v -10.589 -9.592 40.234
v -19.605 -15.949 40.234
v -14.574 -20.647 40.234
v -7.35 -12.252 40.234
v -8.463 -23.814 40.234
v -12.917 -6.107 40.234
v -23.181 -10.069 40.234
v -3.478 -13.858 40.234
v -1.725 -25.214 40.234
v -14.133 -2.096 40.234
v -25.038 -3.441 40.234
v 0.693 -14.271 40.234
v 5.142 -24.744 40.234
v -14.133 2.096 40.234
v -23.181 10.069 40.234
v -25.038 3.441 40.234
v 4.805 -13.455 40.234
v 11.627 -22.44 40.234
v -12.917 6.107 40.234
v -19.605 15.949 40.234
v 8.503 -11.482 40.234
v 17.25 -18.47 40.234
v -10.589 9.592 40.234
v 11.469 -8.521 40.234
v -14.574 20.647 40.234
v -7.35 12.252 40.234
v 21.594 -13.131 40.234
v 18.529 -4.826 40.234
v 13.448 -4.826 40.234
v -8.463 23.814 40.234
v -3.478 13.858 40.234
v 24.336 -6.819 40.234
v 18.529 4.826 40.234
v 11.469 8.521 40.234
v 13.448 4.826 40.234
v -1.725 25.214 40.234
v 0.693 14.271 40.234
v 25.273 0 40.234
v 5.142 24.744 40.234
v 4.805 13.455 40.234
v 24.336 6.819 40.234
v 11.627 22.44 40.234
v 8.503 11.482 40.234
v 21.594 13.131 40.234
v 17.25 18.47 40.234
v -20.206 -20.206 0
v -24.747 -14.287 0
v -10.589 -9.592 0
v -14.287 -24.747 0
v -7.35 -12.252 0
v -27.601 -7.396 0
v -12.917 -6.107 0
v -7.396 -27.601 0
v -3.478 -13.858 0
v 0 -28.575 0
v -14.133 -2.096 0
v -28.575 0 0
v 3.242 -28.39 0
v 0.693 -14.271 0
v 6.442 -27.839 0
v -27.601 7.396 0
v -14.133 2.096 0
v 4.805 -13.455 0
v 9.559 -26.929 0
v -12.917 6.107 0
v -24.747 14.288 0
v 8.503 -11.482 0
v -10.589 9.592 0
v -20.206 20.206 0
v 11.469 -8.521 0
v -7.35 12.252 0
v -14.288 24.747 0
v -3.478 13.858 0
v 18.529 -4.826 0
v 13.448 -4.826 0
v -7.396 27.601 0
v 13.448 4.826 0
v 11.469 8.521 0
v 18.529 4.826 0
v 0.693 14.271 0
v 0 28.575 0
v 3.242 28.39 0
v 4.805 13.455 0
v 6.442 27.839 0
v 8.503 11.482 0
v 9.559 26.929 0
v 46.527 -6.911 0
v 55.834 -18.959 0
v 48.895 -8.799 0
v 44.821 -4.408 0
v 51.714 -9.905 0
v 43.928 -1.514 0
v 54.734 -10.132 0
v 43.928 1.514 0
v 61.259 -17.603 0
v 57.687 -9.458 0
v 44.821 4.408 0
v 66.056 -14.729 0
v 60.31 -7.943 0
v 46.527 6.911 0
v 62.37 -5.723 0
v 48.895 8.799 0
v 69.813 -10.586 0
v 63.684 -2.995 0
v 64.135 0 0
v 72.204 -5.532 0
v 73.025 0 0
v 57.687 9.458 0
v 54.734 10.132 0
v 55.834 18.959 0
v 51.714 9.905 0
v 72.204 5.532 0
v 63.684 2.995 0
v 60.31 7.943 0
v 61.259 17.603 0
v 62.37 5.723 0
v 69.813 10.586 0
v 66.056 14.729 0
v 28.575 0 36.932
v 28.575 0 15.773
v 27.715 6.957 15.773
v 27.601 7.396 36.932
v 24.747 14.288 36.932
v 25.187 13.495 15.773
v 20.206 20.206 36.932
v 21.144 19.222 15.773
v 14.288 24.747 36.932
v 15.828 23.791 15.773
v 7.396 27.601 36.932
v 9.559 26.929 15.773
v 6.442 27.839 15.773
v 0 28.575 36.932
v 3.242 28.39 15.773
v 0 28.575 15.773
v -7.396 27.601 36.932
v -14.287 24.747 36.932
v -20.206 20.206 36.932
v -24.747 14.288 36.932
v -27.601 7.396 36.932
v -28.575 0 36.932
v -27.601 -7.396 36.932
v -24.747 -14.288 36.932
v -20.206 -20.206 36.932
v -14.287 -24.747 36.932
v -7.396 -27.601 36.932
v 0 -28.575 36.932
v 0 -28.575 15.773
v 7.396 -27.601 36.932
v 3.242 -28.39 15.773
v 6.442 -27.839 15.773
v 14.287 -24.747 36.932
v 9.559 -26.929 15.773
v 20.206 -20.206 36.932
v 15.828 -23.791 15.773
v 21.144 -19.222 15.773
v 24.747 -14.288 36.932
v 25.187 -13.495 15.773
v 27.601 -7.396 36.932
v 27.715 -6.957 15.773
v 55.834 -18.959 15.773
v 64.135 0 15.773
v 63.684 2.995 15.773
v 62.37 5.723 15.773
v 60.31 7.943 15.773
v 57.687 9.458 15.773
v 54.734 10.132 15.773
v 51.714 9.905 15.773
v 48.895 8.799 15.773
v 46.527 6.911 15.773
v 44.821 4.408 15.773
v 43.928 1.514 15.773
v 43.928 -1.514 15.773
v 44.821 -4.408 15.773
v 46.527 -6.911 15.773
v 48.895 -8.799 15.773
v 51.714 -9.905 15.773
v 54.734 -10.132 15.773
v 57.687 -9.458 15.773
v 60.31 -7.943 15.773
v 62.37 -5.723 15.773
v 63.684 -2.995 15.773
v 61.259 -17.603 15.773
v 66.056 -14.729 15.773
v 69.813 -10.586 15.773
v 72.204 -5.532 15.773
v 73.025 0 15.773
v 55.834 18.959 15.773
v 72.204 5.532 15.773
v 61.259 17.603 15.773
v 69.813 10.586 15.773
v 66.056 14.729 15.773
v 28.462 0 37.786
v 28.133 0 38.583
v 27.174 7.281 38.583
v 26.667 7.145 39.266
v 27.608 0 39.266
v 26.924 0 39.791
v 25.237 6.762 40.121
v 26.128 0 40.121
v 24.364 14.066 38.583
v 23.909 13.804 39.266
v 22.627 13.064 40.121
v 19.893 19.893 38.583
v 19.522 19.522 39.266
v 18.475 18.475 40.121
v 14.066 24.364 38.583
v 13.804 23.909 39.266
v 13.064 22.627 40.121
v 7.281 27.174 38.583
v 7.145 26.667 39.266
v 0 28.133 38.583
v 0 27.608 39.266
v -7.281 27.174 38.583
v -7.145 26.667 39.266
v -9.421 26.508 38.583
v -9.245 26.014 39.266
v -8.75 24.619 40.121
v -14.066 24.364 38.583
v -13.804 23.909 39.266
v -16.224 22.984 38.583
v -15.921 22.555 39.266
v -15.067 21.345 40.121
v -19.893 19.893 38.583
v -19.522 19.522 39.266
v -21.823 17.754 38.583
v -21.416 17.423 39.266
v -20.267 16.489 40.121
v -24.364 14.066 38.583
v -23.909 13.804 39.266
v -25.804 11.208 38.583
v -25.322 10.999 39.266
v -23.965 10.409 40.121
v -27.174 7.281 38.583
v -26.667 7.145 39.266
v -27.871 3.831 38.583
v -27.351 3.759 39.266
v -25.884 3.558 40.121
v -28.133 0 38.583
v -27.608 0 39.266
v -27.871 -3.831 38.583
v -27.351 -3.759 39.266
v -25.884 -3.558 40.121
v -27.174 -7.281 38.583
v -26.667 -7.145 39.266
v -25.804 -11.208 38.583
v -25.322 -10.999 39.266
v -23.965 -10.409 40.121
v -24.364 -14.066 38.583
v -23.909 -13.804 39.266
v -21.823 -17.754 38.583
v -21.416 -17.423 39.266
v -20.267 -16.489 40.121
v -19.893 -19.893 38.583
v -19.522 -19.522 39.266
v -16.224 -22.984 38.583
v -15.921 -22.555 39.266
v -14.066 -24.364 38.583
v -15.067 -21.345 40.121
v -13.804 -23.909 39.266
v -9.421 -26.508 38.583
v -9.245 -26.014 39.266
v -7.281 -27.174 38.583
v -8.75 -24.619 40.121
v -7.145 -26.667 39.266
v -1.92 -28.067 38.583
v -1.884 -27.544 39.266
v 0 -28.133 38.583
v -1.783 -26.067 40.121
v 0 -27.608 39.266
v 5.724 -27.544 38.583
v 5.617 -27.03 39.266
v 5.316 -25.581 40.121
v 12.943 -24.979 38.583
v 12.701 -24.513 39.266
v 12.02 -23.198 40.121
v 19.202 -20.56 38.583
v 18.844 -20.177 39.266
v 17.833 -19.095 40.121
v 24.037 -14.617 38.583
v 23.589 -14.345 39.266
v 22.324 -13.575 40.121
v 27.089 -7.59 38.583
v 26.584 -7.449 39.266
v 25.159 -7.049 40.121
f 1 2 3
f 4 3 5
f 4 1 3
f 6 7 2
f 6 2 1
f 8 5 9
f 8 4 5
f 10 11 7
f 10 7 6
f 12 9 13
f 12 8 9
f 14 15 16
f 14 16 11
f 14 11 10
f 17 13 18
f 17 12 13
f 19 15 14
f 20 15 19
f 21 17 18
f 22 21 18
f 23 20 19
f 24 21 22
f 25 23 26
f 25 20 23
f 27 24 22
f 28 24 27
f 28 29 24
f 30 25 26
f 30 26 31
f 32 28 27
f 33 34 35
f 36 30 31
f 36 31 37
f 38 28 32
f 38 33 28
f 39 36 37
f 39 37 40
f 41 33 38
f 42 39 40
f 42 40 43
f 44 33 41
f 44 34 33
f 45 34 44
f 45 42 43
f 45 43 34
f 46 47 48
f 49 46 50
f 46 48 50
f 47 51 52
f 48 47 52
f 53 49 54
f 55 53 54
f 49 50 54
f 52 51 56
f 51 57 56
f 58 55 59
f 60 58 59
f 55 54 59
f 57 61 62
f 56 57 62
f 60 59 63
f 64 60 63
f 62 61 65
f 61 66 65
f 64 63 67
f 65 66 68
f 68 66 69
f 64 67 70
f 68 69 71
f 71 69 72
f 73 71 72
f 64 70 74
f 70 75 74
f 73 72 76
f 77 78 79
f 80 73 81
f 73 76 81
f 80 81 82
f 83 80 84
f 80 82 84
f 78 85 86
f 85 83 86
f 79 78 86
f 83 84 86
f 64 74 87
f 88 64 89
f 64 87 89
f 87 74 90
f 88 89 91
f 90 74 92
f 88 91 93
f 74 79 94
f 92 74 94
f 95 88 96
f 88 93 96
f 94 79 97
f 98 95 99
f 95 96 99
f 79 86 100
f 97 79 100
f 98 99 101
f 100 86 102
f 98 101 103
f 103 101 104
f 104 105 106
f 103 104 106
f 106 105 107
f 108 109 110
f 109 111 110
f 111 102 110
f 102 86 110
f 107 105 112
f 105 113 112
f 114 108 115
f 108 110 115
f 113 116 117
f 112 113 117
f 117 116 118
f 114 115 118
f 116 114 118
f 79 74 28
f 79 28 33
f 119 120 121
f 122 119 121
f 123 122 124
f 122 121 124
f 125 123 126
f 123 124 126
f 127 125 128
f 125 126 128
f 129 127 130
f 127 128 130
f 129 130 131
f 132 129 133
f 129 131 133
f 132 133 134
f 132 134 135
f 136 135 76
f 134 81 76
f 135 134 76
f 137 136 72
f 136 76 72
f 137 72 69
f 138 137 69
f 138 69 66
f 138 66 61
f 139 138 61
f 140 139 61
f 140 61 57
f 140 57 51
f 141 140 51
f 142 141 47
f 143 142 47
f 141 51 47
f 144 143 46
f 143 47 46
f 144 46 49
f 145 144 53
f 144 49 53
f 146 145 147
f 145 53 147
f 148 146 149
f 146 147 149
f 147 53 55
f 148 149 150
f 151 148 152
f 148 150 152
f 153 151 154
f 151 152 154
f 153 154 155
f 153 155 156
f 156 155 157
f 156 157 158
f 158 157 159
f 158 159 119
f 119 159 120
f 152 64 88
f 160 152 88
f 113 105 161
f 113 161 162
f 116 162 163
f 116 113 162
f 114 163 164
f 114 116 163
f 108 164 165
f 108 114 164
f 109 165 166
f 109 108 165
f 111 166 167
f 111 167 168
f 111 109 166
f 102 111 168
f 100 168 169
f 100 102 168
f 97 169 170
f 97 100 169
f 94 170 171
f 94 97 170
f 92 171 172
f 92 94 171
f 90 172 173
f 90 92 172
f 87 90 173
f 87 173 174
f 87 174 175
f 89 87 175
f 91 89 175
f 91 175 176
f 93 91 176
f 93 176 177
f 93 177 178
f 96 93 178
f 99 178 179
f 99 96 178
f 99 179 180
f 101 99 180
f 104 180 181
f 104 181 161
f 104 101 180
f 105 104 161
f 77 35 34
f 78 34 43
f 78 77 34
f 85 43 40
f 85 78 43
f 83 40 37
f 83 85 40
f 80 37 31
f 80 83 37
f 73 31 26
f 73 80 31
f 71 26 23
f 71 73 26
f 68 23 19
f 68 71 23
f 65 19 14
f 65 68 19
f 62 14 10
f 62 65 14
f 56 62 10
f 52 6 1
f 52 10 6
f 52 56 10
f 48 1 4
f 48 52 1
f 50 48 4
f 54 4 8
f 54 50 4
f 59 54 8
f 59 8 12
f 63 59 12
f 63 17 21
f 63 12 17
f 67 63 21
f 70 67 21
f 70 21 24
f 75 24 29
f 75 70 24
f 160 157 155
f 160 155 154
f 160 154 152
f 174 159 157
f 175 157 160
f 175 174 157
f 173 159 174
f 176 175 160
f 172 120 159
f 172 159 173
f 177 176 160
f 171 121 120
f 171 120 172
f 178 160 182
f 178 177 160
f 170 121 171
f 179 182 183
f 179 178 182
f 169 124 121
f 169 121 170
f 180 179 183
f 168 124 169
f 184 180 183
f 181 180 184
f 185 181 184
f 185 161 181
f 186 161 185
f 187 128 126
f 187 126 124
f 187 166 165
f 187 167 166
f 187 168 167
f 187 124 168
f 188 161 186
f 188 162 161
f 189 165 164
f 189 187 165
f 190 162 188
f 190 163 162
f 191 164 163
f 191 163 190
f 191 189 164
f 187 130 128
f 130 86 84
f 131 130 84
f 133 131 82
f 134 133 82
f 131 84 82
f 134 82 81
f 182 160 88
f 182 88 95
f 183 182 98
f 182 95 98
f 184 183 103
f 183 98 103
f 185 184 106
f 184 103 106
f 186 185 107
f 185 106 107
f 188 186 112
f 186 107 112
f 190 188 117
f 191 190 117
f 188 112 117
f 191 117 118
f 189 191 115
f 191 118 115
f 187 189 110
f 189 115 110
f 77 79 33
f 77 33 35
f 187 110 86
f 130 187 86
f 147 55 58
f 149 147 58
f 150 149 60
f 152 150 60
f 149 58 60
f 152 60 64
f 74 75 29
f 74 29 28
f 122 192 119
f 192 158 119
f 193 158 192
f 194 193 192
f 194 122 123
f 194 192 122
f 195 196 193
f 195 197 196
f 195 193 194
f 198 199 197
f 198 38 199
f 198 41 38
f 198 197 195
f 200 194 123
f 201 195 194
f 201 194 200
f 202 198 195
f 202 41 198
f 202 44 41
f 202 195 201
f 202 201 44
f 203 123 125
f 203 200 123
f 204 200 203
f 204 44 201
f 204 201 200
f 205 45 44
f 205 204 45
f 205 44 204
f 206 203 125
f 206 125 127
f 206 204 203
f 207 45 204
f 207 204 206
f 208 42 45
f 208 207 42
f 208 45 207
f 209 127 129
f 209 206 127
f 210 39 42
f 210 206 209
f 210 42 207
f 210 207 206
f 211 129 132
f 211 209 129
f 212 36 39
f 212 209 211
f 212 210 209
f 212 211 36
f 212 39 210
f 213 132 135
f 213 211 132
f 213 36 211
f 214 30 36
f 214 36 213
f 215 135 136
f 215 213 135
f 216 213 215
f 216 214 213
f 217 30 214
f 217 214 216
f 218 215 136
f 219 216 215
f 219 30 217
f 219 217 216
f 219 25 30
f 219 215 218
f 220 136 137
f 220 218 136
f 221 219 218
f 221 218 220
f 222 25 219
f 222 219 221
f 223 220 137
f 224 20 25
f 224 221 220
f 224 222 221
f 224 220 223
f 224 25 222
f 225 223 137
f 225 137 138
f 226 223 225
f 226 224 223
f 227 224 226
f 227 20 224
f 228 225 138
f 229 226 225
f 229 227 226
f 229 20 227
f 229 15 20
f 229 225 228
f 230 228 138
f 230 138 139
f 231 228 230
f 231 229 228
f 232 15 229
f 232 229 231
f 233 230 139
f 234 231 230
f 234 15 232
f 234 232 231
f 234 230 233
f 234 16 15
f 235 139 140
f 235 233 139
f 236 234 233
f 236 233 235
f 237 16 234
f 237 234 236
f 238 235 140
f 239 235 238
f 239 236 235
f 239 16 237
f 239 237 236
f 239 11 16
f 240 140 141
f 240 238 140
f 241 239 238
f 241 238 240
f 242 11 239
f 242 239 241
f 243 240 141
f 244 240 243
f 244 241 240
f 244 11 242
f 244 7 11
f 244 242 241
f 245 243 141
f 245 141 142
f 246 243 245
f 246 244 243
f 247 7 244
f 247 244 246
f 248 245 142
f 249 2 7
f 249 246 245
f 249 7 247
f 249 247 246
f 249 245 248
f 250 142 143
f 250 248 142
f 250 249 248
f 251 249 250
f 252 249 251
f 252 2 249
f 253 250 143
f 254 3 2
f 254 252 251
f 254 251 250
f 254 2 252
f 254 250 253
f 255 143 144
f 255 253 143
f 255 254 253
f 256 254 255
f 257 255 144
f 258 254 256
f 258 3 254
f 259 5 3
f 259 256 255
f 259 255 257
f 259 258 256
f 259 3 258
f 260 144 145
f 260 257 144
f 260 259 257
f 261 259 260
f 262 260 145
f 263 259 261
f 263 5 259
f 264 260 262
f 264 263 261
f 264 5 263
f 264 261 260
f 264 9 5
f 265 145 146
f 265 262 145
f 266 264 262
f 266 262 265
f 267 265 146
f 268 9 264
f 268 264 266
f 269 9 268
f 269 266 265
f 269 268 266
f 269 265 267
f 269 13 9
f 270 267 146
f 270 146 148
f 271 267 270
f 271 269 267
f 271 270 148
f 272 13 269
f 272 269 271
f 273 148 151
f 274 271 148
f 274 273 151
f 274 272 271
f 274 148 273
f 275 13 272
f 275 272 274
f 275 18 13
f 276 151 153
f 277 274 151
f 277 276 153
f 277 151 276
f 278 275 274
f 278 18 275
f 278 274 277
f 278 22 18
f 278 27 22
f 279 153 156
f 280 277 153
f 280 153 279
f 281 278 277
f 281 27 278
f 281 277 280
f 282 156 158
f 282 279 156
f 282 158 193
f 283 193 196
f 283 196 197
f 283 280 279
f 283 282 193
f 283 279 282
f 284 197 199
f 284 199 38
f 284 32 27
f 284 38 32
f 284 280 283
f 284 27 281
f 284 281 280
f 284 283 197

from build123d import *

# Parameters (mm, degrees)
F0_R     = 10.16
F1_DEPTH = 15.7734
F2_R     = 28.575
F3_DEPTH = 40.2336
F5_DEPTH = 40.2346
F6_R     = 3.302


with BuildPart() as f1:
    # F0 (on Top) → F1 (new body)
    with BuildSketch(Plane.XY):
        with BuildLine():
            Line((9.559057, 26.928703), (0, 28.575))
            ThreePointArc((0, 28.575), (-28.575, 0), (0, -28.575))
            Line((0, -28.575), (9.559057, -26.928703))
            ThreePointArc((9.559057, -26.928703), (23.341815, -16.48303), (28.575, 0))
            ThreePointArc((28.575, 0), (23.341815, 16.48303), (9.559057, 26.928703))
        make_face()
        with BuildLine():
            ThreePointArc((13.447765, -4.826), (-14.2875, 0), (13.447765, 4.826))
            Line((13.447765, 4.826), (18.5293, 4.826))
            Line((18.5293, 4.826), (18.5293, 0))
            Line((18.5293, 0), (18.5293, -4.826))
            Line((18.5293, -4.826), (13.447765, -4.826))
        make_face(mode=Mode.SUBTRACT)
        with BuildLine():
            ThreePointArc((9.559057, 26.928703), (4.849894, 28.160418), (0, 28.575))
            Line((0, 28.575), (9.559057, 26.928703))
        make_face()
        with BuildLine():
            Line((9.559057, -26.928703), (0, -28.575))
            ThreePointArc((0, -28.575), (4.849894, -28.160418), (9.559057, -26.928703))
        make_face()
        with BuildLine():
            Line((55.833732, 18.959104), (9.559057, 26.928703))
            ThreePointArc((9.559057, 26.928703), (23.341815, 16.48303), (28.575, 0))
            ThreePointArc((28.575, 0), (23.341815, -16.48303), (9.559057, -26.928703))
            Line((9.559057, -26.928703), (55.833732, -18.959104))
            ThreePointArc((55.833732, -18.959104), (73.025, 0), (55.833732, 18.959104))
        make_face()
        with Locations((53.975, 0)):
            Circle(F0_R, mode=Mode.SUBTRACT)
    extrude(amount=F1_DEPTH)

    # F2 (on Top) → F3 (join)
    with BuildSketch(Plane.XY):
        Circle(F2_R)
    extrude(amount=F3_DEPTH)

    # F4 (on Top) → F5 (cut, through all)
    with BuildSketch(Plane.XY):
        with BuildLine():
            Line((18.5293, 4.826), (13.447765, 4.826))
            ThreePointArc((13.447765, 4.826), (-14.2875, 0), (13.447765, -4.826))
            Line((13.447765, -4.826), (18.5293, -4.826))
            Line((18.5293, -4.826), (18.5293, 0))
            Line((18.5293, 0), (18.5293, 4.826))
        make_face()
    extrude(amount=F5_DEPTH, mode=Mode.SUBTRACT)

    # F6
    f6_edges = [f1.edges().sort_by_distance(p)[0] for p in [
        (-28.575, 0, 40.2336),
    ]]
    fillet(f6_edges, radius=F6_R)


solid = f1.part
